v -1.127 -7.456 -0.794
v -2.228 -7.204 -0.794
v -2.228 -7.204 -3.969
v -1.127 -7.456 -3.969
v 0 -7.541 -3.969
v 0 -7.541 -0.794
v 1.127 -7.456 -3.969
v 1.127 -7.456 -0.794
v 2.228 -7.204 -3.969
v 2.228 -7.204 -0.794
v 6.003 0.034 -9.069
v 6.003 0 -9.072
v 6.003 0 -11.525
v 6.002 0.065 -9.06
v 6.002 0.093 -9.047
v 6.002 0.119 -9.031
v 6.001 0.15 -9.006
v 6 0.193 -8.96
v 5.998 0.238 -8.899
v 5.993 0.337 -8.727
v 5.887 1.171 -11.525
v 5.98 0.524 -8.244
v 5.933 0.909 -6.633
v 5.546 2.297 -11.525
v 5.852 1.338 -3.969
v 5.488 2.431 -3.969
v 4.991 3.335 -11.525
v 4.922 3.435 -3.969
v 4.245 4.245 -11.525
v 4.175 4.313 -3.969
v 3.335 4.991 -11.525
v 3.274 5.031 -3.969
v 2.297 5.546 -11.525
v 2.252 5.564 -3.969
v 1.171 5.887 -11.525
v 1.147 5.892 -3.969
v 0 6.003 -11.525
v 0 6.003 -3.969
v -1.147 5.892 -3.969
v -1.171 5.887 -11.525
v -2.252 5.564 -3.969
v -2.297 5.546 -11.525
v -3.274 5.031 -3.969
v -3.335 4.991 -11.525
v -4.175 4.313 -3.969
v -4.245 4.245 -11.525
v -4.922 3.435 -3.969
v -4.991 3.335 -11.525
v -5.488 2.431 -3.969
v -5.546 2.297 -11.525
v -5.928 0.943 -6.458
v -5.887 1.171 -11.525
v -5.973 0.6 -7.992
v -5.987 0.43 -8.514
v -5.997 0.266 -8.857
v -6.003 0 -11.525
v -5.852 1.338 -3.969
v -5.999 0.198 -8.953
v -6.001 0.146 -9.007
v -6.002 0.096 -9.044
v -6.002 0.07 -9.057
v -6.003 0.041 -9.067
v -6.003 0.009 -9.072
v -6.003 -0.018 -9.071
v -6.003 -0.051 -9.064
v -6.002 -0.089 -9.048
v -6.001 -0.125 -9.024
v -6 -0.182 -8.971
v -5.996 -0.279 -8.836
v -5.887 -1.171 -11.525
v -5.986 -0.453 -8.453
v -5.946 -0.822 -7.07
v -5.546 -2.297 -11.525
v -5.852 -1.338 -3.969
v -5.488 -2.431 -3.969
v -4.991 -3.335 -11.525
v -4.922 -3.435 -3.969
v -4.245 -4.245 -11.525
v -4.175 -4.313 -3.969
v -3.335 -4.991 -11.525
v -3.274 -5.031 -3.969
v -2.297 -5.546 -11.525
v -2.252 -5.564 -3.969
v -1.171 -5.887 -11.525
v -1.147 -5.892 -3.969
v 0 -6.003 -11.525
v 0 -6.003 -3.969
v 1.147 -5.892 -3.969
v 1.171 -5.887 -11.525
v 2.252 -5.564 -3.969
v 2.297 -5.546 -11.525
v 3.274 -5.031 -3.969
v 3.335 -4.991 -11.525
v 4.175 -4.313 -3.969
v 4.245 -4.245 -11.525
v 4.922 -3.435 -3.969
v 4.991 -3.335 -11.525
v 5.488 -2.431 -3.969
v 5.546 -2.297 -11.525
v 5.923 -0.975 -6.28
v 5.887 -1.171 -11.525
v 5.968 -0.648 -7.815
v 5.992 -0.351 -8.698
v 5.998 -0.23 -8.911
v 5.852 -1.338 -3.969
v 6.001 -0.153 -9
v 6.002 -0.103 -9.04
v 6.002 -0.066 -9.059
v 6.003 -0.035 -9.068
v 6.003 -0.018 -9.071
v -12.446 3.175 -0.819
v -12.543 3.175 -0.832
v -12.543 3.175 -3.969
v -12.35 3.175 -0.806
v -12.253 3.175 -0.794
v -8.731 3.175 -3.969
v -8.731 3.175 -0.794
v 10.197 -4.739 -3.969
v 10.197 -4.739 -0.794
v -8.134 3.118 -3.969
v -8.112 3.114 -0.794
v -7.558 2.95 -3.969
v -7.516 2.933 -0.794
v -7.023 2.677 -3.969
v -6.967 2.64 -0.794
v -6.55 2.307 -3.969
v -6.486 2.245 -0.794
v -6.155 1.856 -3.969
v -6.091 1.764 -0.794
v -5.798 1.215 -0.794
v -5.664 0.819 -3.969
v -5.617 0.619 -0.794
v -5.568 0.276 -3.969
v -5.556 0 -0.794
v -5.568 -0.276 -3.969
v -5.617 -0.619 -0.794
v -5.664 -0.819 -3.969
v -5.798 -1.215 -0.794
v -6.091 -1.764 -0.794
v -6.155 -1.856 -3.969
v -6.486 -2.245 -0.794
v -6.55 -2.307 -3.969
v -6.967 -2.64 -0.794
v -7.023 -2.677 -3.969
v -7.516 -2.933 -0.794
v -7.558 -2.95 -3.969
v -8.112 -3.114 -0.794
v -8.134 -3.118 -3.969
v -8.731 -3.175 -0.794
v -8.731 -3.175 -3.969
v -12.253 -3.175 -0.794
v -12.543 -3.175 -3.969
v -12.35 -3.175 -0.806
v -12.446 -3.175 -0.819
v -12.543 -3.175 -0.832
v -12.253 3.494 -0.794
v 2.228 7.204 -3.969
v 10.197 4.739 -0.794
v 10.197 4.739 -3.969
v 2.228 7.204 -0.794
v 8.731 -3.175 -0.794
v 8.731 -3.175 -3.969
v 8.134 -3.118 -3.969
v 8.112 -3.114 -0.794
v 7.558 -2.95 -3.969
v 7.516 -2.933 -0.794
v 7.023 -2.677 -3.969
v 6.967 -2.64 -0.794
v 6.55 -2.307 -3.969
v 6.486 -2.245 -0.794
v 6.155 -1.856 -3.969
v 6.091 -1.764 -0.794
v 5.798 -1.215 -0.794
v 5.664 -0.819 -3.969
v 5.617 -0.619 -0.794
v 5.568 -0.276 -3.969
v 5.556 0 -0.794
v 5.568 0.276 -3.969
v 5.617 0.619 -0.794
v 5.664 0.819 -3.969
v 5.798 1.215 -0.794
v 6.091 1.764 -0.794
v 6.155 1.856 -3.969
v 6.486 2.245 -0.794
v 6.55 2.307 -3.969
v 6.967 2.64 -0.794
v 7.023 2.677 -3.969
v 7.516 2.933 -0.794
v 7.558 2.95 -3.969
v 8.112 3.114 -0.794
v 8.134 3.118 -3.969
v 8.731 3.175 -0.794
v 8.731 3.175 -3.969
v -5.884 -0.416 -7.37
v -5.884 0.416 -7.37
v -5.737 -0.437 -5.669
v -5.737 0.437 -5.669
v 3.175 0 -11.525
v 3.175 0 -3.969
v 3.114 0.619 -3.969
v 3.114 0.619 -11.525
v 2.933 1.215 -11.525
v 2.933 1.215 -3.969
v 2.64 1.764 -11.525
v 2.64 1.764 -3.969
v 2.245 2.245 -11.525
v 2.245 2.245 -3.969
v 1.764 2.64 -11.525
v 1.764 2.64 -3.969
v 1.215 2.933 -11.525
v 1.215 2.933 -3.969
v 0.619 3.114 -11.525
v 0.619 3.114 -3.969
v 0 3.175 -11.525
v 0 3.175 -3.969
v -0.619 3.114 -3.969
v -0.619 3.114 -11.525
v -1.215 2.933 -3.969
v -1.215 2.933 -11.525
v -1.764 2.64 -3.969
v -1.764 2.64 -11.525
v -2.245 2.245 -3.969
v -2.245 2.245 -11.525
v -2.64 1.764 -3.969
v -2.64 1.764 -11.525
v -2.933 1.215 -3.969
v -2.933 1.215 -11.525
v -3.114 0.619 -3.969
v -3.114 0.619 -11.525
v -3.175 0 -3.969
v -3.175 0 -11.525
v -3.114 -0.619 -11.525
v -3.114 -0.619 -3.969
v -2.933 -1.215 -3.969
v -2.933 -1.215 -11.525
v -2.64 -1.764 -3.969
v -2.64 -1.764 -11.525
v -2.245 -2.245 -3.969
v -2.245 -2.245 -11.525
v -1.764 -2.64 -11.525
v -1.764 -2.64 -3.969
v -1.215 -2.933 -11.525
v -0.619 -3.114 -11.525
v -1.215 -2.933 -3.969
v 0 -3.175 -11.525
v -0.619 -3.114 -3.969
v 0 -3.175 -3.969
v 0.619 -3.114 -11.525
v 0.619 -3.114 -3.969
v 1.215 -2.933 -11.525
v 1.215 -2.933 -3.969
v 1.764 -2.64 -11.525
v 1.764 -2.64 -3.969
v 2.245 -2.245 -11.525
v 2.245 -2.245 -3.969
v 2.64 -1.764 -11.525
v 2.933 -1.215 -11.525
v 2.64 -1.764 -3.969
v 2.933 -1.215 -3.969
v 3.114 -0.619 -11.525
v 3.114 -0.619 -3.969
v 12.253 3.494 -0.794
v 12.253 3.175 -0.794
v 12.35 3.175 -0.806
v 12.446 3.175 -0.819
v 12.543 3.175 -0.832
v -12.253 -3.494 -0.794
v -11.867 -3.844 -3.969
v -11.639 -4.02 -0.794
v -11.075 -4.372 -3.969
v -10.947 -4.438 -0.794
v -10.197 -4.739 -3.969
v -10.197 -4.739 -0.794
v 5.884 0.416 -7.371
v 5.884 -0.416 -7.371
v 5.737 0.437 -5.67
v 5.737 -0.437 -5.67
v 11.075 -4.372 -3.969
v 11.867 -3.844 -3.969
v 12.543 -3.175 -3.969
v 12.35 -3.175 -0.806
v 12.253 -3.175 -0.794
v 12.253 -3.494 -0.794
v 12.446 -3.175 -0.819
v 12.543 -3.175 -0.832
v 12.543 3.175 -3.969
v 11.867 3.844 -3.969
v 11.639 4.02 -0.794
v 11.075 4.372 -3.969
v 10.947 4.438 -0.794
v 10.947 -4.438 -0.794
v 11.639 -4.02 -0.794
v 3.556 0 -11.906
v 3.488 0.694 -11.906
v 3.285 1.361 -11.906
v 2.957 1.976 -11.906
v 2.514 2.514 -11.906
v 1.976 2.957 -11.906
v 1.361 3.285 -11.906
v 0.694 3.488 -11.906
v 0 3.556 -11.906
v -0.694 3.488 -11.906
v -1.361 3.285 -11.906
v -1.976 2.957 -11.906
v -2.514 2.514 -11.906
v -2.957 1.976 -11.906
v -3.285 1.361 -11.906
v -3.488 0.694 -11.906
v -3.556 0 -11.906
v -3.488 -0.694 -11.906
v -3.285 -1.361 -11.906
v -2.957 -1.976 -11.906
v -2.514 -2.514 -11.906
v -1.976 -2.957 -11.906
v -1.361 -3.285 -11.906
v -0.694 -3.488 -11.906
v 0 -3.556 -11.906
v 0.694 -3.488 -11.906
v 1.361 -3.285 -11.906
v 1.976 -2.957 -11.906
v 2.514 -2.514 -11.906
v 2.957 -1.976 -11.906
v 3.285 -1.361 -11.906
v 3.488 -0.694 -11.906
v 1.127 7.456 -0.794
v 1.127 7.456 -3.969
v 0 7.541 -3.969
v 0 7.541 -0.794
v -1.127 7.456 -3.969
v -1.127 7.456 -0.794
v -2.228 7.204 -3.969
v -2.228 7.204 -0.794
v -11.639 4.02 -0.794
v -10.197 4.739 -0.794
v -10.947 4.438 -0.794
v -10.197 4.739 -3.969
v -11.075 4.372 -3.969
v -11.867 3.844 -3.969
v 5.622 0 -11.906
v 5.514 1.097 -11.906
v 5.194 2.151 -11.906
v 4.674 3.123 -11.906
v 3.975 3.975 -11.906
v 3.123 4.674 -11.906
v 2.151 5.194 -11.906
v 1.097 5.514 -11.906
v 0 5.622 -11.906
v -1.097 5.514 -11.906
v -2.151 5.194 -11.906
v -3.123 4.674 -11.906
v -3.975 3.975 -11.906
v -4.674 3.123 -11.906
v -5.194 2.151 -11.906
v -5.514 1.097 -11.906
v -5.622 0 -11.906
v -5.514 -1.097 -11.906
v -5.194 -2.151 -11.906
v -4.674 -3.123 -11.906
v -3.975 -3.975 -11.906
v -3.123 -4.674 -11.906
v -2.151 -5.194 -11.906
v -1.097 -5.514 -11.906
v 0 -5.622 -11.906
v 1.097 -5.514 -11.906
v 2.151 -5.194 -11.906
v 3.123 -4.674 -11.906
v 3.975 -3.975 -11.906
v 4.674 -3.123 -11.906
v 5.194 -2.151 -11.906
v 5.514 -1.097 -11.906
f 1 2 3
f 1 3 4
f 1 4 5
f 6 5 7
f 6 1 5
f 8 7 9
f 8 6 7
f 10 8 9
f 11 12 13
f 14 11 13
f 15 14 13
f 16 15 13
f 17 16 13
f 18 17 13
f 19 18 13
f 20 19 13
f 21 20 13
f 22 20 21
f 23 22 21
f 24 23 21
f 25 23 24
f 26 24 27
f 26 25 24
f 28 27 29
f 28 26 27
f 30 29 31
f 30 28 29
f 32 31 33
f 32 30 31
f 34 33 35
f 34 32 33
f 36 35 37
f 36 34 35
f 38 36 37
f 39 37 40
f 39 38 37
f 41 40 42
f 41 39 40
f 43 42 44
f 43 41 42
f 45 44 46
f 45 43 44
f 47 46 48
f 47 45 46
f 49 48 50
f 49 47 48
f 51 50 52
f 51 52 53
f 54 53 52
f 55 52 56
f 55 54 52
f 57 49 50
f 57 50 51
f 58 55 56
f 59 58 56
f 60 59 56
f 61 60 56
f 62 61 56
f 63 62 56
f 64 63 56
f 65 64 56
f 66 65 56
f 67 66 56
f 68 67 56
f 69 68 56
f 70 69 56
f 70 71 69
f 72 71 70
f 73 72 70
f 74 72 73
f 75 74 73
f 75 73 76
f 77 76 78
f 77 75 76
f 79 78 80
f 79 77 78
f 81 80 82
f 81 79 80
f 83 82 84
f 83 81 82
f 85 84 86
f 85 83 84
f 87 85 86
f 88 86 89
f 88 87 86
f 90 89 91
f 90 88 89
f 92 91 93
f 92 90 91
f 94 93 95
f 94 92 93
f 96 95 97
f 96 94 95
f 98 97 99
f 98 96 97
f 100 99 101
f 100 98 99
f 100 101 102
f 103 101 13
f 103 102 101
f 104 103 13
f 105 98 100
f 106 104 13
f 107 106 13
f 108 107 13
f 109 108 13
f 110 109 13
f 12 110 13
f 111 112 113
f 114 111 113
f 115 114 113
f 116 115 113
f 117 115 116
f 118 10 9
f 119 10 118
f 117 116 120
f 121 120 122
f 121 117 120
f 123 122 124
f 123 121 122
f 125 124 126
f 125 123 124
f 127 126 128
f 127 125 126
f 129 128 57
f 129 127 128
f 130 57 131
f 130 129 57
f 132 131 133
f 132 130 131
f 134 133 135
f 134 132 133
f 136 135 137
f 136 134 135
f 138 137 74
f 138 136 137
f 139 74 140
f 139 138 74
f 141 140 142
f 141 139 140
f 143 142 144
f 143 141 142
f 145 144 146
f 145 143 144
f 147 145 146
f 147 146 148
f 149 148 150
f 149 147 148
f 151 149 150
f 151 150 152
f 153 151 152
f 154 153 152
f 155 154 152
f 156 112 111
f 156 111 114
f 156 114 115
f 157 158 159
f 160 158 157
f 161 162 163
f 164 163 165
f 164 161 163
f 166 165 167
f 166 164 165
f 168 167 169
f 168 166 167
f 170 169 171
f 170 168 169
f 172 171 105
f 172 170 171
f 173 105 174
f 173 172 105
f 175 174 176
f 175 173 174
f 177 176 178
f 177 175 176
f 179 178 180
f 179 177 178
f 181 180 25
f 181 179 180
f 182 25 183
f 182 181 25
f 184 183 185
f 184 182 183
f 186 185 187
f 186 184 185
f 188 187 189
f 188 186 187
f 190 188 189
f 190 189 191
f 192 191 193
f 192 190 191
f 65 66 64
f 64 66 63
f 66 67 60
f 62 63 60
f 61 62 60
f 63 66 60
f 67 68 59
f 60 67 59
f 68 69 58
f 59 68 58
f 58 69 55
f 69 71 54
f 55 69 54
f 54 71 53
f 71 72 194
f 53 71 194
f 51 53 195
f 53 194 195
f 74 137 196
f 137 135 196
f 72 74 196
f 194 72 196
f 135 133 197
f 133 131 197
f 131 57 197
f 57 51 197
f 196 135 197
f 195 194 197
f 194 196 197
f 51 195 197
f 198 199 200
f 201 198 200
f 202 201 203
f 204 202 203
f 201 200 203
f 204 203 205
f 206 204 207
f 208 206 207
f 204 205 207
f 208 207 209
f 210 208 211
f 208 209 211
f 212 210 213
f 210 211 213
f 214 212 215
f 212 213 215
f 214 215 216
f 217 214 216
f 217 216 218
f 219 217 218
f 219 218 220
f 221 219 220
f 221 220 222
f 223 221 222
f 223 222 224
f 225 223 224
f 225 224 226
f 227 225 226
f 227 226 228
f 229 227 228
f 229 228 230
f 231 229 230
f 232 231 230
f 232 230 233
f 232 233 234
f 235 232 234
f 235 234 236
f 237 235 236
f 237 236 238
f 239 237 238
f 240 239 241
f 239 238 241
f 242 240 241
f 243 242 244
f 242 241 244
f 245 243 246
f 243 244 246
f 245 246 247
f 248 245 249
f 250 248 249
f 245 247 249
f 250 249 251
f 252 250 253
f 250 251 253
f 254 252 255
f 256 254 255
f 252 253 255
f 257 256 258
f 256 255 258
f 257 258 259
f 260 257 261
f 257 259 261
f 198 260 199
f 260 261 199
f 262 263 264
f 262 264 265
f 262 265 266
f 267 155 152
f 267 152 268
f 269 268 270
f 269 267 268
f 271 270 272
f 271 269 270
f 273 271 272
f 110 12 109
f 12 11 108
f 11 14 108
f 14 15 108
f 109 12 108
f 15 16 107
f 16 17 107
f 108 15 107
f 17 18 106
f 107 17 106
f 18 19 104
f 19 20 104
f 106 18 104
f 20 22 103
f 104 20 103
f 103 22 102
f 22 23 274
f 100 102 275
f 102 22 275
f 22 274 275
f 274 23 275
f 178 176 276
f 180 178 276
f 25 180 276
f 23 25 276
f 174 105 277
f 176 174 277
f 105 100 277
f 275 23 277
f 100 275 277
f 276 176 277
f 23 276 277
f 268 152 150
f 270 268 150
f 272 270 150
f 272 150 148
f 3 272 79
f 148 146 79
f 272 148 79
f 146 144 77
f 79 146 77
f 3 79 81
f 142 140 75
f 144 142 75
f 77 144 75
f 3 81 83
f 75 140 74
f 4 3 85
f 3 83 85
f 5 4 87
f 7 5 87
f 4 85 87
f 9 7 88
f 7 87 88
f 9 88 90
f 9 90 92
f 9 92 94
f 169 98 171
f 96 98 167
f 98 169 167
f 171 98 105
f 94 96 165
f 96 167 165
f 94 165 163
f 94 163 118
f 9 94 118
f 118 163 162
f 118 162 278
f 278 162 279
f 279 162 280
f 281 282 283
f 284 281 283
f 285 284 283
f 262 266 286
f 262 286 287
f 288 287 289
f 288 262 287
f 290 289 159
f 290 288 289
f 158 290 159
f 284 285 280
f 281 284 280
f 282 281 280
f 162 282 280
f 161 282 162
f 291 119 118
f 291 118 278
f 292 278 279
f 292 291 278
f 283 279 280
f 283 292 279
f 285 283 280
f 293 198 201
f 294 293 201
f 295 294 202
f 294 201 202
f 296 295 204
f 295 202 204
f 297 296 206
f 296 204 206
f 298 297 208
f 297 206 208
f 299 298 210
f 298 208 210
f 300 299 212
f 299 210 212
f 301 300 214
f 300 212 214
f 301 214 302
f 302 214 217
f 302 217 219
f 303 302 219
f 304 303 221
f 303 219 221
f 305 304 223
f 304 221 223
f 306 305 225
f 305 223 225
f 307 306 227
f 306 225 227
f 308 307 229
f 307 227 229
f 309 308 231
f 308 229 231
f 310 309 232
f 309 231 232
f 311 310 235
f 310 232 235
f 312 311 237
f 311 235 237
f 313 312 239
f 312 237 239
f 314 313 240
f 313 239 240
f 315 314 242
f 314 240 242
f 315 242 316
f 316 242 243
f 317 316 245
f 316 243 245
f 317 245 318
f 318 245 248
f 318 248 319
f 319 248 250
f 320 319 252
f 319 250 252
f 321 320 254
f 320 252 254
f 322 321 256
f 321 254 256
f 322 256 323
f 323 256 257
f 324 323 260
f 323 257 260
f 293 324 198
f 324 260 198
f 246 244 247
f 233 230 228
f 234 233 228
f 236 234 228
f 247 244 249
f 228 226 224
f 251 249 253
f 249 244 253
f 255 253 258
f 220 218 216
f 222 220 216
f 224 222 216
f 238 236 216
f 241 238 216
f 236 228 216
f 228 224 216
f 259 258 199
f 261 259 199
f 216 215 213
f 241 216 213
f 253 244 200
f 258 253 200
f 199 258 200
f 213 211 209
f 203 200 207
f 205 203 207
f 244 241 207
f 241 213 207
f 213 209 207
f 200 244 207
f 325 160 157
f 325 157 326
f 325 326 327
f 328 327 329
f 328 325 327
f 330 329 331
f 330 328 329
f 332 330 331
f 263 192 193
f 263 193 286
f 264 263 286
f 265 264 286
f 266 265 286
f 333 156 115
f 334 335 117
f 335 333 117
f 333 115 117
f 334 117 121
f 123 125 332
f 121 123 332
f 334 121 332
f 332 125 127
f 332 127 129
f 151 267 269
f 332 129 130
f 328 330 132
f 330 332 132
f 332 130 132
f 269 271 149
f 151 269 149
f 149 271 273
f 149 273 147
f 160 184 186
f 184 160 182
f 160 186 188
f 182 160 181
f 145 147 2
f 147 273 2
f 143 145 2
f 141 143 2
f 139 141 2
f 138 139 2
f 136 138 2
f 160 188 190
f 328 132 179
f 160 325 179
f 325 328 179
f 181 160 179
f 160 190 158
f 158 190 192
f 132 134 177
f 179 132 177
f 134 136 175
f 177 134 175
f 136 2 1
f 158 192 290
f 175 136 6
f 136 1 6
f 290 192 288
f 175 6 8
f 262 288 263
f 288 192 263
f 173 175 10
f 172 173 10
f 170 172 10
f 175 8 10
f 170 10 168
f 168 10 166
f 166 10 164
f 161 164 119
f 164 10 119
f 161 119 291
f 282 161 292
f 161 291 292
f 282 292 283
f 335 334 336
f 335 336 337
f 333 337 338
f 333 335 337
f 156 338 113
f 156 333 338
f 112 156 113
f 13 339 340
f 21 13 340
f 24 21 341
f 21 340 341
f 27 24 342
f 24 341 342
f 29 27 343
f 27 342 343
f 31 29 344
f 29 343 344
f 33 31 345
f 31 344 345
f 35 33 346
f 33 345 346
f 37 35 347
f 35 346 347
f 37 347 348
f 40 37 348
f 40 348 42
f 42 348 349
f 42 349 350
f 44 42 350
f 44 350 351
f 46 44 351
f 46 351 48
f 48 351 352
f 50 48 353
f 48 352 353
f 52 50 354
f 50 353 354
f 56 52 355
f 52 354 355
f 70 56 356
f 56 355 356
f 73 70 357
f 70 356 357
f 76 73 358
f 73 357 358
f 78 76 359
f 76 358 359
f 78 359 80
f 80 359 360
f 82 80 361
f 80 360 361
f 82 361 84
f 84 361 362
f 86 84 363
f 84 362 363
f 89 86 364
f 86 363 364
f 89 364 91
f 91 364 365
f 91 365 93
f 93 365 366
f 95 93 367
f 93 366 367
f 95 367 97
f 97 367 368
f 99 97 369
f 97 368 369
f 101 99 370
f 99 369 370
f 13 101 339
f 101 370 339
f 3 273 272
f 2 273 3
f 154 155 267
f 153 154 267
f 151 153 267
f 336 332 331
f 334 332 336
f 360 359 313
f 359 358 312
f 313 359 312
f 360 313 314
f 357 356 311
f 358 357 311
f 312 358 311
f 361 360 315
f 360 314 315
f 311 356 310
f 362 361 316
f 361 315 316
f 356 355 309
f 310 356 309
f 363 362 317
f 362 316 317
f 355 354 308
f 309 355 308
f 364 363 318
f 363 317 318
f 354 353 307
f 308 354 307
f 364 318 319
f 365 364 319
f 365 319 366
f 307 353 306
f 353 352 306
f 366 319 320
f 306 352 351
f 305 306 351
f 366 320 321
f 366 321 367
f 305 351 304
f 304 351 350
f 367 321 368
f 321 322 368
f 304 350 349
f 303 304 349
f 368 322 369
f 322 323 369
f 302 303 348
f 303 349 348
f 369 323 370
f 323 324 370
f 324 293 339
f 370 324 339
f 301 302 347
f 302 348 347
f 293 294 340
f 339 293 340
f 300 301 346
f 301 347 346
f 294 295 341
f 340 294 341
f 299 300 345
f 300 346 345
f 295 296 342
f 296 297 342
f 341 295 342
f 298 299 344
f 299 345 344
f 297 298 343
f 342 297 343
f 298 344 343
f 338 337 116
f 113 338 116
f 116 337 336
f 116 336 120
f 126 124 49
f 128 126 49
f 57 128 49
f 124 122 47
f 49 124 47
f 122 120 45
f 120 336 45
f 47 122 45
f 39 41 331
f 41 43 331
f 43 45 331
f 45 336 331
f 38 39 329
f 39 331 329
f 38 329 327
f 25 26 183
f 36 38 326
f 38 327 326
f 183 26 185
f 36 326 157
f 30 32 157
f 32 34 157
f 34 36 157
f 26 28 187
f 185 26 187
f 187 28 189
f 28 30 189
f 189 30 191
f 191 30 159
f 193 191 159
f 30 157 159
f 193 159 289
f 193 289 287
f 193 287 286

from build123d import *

# Parameters (mm, degrees)
SKETCH2_R               = 6.002734375
SKETCH2_R_2             = 3.175
EXTRUDE1_DEPTH          = 11.90625
SKETCH3_R               = 1.7859375
EXTRUDE2_DEPTH          = 3.96875
CUT_EXTRUDE2_DEPTH      = 12.7
CHAMFER1_SIZE           = 0.381
CUT_EXTRUDE3_START      = -3.818600123
CUT_EXTRUDE3_OUTLINE_R  = 1.7859375
CUT_EXTRUDE3_DEPTH      = 3.818600123
CUT_EXTRUDE4_DEPTH      = 25.4
CUT_EXTRUDE4_DEPTH_BACK = 25.4
SKETCH7_W               = 25.086219796
SKETCH7_H               = 3.328995852


with BuildPart() as part:
    # Sketch2 → Extrude1 (new body)
    with BuildSketch(Plane.XY):
        Circle(SKETCH2_R)
        Circle(SKETCH2_R_2, mode=Mode.SUBTRACT)
    extrude(amount=-EXTRUDE1_DEPTH)

    # Sketch3 → Extrude2 (add)
    with BuildSketch(Plane.XY):
        with BuildLine():
            Line((-10.196981534, -4.739465365), (-2.227911932, -7.203987355))
            ThreePointArc((-2.227911932, -7.203987355), (0, -7.540625), (2.227911932, -7.203987355))
            Line((2.227911932, -7.203987355), (10.196981534, -4.739465365))
            ThreePointArc((10.196981534, -4.739465365), (13.6921875, 0), (10.196981534, 4.739465365))
            Line((10.196981534, 4.739465365), (2.227911932, 7.203987355))
            ThreePointArc((2.227911932, 7.203987355), (0, 7.540625), (-2.227911932, 7.203987355))
            Line((-2.227911932, 7.203987355), (-10.196981534, 4.739465365))
            ThreePointArc((-10.196981534, 4.739465365), (-13.6921875, 0), (-10.196981534, -4.739465365))
        make_face()
        with Locations((8.73125, 0)):
            Circle(SKETCH3_R, mode=Mode.SUBTRACT)
        with Locations((-8.73125, 0)):
            Circle(SKETCH3_R, mode=Mode.SUBTRACT)
    extrude(amount=-EXTRUDE2_DEPTH)

    # Cut-Extrude1 cone 1 section (through the dimple's axis) → Cut-Extrude1 (revolve, cut)
    with BuildSketch(Plane(origin=(8.73125, 0, 0), x_dir=(0, -1, 0), z_dir=(1, 0, 0))):
        Polygon((0, 0), (3.571875, 0), (0, 2.997158995), align=None)
    revolve(axis=Axis((8.73125, 0, 0), (0, 0, -1)), mode=Mode.SUBTRACT)

    # Cut-Extrude1 cone 2 section (through the dimple's axis) → Cut-Extrude1 cone 2 (revolve, cut)
    with BuildSketch(Plane(origin=(-8.73125, 0, 0), x_dir=(0, -1, 0), z_dir=(1, 0, 0))):
        Polygon((0, 0), (3.571875, 0), (0, 2.997158995), align=None)
    revolve(axis=Axis((-8.73125, 0, 0), (0, 0, -1)), mode=Mode.SUBTRACT)

    # Sketch5 → Cut-Extrude2 (cut, symmetric)
    with BuildSketch(Plane(origin=(0, 0, 0), x_dir=(1, 0, 0), z_dir=(0, 1, 0))):
        with BuildLine():
            Line((13.6921875, 0.9921875), (13.6921875, -0.635))
            Line((13.6921875, -0.635), (-13.6921875, -0.635))
            Line((-13.6921875, -0.635), (-13.6921875, 0.9921875))
            ThreePointArc((-13.6921875, 0.9921875), (0, 0), (13.6921875, 0.9921875))
        make_face()
    extrude(amount=CUT_EXTRUDE2_DEPTH, both=True, mode=Mode.SUBTRACT)

    # Chamfer1
    chamfer1_edges = [part.edges().sort_by_distance(p)[0] for p in [
        (-6.002734375, 0, -11.90625),
        (-3.175, 0, -11.90625),
    ]]
    chamfer(chamfer1_edges, length=CHAMFER1_SIZE)

    # Cut-Extrude3: read off the stored shape, not the designer's step
    # Cut-Extrude3 outline → Cut-Extrude3 (cut)
    # profile 1 of 2: a face of its own
    with BuildSketch(Plane(origin=(0, 0, -3.96875), x_dir=(-1, 0, 0), z_dir=(0, 0, -1)).offset(CUT_EXTRUDE3_START)):
        with BuildLine():
            ThreePointArc((-12.543109898, 3.175), (-13.6921875, 0), (-12.543109898, -3.175))
            Line((-12.543109898, -3.175), (-8.73125, -3.175))
            ThreePointArc((-8.73125, -3.175), (-5.55625, 0), (-8.73125, 3.175))
            Line((-8.73125, 3.175), (-12.543109898, 3.175))
        make_face()
        with Locations((-8.73125, 0)):
            Circle(CUT_EXTRUDE3_OUTLINE_R, mode=Mode.SUBTRACT)
    # profile 2 of 2: a face of its own
    with BuildSketch(Plane(origin=(0, 0, -3.96875), x_dir=(-1, 0, 0), z_dir=(0, 0, -1)).offset(CUT_EXTRUDE3_START)):
        with BuildLine():
            ThreePointArc((8.73125, 3.175), (5.55625, 0), (8.73125, -3.175))
            Line((8.73125, -3.175), (12.543109898, -3.175))
            ThreePointArc((12.543109898, -3.175), (13.6921875, 0), (12.543109898, 3.175))
            Line((12.543109898, 3.175), (8.73125, 3.175))
        make_face()
        with Locations((8.73125, 0)):
            Circle(CUT_EXTRUDE3_OUTLINE_R, mode=Mode.SUBTRACT)
    extrude(amount=CUT_EXTRUDE3_DEPTH, mode=Mode.SUBTRACT)

    # Cut-Extrude3 2 outline → Cut-Extrude3 2 (revolve, cut)
    with BuildSketch(Plane(origin=(8.73125, 0, 0), x_dir=(1, 0, 0), z_dir=(0, -1, 0))):
        Polygon((2.728509965, -3.968749996), (2.728509965, -9.072154448), (3.175, -3.968749996), align=None)
    revolve(axis=Axis((8.73125, 0, 0), (0, 0, 1)), mode=Mode.SUBTRACT)

    # Cut-Extrude3 3 outline → Cut-Extrude3 3 (revolve, cut)
    with BuildSketch(Plane(origin=(-8.73125, 0, 0), x_dir=(1, 0, 0), z_dir=(0, -1, 0))):
        Polygon((2.728515625, -3.968749996), (2.728515625, -9.07208976), (3.175, -3.968749996), align=None)
    revolve(axis=Axis((-8.73125, 0, 0), (0, 0, 1)), mode=Mode.SUBTRACT)

    # Sketch7 → Cut-Extrude4 (cut, two sides: drawn at the far end of the back side and taken through both)
    with BuildSketch(Plane(origin=(0, 0, 0), x_dir=(1, 0, 0), z_dir=(0, 1, 0)).offset(-CUT_EXTRUDE4_DEPTH_BACK)):
        with Locations((0, -0.870747926)):
            Rectangle(SKETCH7_W, SKETCH7_H)
    extrude(amount=CUT_EXTRUDE4_DEPTH + CUT_EXTRUDE4_DEPTH_BACK, mode=Mode.SUBTRACT)


solid = part.part
